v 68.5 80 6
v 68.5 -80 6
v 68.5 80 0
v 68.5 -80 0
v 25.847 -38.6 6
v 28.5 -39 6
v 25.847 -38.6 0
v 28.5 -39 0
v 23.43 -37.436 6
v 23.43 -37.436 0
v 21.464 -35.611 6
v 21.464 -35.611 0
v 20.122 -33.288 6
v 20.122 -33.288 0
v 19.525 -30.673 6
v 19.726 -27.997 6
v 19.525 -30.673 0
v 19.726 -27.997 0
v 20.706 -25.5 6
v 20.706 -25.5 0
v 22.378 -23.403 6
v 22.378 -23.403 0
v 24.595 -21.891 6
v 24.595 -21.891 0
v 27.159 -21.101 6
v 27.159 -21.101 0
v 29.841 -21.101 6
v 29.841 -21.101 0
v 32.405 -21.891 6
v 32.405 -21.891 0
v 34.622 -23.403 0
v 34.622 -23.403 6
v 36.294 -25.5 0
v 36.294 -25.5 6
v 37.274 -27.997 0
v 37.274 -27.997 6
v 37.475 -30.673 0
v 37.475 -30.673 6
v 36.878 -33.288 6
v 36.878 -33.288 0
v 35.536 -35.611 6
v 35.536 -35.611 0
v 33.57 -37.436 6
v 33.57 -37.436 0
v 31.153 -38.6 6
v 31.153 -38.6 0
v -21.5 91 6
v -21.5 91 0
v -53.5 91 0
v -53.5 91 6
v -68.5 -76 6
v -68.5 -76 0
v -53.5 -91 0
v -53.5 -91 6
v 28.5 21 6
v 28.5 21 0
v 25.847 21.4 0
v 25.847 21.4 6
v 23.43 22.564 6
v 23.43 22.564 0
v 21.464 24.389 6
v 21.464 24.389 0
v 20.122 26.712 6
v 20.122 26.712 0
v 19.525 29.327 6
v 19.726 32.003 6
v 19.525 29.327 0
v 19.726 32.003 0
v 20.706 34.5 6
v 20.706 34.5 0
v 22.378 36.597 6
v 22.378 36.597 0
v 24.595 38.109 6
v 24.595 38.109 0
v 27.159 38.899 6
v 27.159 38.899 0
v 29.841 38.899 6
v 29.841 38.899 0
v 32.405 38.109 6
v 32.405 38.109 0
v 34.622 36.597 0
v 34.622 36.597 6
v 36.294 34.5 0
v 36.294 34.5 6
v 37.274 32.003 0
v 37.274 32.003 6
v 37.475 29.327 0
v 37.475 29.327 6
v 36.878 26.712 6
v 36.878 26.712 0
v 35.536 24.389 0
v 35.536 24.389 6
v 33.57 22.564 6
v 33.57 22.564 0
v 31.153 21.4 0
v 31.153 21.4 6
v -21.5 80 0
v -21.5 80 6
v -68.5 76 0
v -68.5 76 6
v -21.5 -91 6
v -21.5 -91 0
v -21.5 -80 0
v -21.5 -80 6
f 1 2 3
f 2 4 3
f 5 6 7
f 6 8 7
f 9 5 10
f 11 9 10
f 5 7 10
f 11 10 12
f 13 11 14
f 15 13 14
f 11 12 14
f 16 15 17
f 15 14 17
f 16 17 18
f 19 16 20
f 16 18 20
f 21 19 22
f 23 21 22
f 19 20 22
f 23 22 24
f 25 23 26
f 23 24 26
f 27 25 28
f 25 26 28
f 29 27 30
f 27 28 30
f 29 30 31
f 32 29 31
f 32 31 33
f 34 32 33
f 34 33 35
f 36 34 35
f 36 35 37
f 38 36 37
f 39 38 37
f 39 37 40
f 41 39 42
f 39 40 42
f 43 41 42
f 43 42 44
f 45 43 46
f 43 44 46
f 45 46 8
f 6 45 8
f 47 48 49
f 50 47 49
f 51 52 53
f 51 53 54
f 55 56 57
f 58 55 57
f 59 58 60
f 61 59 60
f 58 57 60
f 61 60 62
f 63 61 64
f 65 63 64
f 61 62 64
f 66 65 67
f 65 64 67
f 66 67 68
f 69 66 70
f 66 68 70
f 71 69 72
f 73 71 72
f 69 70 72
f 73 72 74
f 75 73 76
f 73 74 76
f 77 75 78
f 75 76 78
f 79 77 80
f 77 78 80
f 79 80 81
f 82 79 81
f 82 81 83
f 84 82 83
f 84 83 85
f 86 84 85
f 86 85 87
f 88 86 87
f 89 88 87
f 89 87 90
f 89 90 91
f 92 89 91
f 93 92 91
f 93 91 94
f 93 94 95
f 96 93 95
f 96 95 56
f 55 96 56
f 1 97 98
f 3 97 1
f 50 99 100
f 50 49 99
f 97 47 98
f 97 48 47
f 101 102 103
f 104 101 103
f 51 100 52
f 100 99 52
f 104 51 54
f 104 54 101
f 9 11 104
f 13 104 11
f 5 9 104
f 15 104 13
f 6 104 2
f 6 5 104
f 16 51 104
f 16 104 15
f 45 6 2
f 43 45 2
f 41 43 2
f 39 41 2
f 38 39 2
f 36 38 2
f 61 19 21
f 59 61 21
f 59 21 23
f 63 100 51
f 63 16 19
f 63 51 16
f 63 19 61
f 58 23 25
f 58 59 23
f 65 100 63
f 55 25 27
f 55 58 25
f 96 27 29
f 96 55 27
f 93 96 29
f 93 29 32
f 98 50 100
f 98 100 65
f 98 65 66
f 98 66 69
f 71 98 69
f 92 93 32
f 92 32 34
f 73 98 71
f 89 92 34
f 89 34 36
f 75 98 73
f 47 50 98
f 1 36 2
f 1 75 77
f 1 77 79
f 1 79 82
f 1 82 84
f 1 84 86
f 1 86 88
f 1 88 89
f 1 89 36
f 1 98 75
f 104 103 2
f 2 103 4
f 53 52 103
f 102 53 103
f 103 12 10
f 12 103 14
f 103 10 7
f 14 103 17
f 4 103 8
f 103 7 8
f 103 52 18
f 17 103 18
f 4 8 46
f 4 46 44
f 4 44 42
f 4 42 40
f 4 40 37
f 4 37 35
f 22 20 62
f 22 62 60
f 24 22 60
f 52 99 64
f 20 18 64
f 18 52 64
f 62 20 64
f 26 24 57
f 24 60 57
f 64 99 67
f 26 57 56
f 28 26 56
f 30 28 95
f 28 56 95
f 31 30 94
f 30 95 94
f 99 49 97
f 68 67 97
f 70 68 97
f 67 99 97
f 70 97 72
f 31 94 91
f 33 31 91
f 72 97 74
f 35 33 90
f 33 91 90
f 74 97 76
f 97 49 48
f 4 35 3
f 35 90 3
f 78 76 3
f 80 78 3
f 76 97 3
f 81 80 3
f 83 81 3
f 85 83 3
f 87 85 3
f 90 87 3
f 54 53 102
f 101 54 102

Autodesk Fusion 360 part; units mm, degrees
sketch "スケッチ1" plane through (0, 0, 0) normal (0, 0, 1) x (1, 0, 0)
  line L0 (-21.5, 91) -> (-68.5, 91)
  line L1 (-68.5, 91) -> (-68.5, -91)
  line L2 (-68.5, -91) -> (-21.5, -91)
  line L3 (68.5, -80) -> (68.5, 80)
  line L4 (60.2198, 80) -> (-68.5, -91) construction
  line L5 (-68.5, 91) -> (60.2198, -80) construction
  line L6 (-21.5, 91) -> (-21.5, 80)
  line L7 (-21.5, 80) -> (68.5, 80)
  line L8 (-21.5, -91) -> (-21.5, -80)
  line L9 (-21.5, -80) -> (68.5, -80)
  dimension "d2" = 182
extrude "押し出し1" add sketch "スケッチ1" along normal blind 6
chamfer "面取り1" distance 15 angle 45 2 edges at (-68.5, -91, 3) (-68.5, 91, 3)
sketch "スケッチ2" plane through (0, 0, 6) normal (0, 0, 1) x (-1, 0, 0)
  line L0 (53.5, -91) -> (68.5, -76)
  line L1 (68.5, -76) -> (68.5, 76)
  line L2 (68.5, 76) -> (53.5, 91)
  line L3 (53.5, 91) -> (21.5, 91)
  line L4 (21.5, 91) -> (21.5, 80)
  line L5 (21.5, 80) -> (-68.5, 80)
  line L6 (-68.5, 80) -> (-68.5, -80)
  line L7 (-68.5, -80) -> (21.5, -80)
  line L8 (21.5, -80) -> (21.5, -91)
  line L9 (21.5, -91) -> (53.5, -91)
  line L10 (-68.5, -80) -> (-28.5, -80) construction
  line L11 (-28.5, -80) -> (-28.5, -30) construction
  line L12 (-28.5, -30) -> (-68.5, -30) construction
  line L13 (-68.5, -30) -> (-68.5, -80) construction
  line L14 (-68.5, 0) -> (91.4537, 0)
  point P0 (-28.5, -30)
  point P1 (-28.5, 30)
  dimension "d10" = 40
  dimension "d11" = 50
hole "穴1" at (28.5, 30, 6) at (28.5, -30, 6) direction (0, 0, -1) diameter 18 end through all
